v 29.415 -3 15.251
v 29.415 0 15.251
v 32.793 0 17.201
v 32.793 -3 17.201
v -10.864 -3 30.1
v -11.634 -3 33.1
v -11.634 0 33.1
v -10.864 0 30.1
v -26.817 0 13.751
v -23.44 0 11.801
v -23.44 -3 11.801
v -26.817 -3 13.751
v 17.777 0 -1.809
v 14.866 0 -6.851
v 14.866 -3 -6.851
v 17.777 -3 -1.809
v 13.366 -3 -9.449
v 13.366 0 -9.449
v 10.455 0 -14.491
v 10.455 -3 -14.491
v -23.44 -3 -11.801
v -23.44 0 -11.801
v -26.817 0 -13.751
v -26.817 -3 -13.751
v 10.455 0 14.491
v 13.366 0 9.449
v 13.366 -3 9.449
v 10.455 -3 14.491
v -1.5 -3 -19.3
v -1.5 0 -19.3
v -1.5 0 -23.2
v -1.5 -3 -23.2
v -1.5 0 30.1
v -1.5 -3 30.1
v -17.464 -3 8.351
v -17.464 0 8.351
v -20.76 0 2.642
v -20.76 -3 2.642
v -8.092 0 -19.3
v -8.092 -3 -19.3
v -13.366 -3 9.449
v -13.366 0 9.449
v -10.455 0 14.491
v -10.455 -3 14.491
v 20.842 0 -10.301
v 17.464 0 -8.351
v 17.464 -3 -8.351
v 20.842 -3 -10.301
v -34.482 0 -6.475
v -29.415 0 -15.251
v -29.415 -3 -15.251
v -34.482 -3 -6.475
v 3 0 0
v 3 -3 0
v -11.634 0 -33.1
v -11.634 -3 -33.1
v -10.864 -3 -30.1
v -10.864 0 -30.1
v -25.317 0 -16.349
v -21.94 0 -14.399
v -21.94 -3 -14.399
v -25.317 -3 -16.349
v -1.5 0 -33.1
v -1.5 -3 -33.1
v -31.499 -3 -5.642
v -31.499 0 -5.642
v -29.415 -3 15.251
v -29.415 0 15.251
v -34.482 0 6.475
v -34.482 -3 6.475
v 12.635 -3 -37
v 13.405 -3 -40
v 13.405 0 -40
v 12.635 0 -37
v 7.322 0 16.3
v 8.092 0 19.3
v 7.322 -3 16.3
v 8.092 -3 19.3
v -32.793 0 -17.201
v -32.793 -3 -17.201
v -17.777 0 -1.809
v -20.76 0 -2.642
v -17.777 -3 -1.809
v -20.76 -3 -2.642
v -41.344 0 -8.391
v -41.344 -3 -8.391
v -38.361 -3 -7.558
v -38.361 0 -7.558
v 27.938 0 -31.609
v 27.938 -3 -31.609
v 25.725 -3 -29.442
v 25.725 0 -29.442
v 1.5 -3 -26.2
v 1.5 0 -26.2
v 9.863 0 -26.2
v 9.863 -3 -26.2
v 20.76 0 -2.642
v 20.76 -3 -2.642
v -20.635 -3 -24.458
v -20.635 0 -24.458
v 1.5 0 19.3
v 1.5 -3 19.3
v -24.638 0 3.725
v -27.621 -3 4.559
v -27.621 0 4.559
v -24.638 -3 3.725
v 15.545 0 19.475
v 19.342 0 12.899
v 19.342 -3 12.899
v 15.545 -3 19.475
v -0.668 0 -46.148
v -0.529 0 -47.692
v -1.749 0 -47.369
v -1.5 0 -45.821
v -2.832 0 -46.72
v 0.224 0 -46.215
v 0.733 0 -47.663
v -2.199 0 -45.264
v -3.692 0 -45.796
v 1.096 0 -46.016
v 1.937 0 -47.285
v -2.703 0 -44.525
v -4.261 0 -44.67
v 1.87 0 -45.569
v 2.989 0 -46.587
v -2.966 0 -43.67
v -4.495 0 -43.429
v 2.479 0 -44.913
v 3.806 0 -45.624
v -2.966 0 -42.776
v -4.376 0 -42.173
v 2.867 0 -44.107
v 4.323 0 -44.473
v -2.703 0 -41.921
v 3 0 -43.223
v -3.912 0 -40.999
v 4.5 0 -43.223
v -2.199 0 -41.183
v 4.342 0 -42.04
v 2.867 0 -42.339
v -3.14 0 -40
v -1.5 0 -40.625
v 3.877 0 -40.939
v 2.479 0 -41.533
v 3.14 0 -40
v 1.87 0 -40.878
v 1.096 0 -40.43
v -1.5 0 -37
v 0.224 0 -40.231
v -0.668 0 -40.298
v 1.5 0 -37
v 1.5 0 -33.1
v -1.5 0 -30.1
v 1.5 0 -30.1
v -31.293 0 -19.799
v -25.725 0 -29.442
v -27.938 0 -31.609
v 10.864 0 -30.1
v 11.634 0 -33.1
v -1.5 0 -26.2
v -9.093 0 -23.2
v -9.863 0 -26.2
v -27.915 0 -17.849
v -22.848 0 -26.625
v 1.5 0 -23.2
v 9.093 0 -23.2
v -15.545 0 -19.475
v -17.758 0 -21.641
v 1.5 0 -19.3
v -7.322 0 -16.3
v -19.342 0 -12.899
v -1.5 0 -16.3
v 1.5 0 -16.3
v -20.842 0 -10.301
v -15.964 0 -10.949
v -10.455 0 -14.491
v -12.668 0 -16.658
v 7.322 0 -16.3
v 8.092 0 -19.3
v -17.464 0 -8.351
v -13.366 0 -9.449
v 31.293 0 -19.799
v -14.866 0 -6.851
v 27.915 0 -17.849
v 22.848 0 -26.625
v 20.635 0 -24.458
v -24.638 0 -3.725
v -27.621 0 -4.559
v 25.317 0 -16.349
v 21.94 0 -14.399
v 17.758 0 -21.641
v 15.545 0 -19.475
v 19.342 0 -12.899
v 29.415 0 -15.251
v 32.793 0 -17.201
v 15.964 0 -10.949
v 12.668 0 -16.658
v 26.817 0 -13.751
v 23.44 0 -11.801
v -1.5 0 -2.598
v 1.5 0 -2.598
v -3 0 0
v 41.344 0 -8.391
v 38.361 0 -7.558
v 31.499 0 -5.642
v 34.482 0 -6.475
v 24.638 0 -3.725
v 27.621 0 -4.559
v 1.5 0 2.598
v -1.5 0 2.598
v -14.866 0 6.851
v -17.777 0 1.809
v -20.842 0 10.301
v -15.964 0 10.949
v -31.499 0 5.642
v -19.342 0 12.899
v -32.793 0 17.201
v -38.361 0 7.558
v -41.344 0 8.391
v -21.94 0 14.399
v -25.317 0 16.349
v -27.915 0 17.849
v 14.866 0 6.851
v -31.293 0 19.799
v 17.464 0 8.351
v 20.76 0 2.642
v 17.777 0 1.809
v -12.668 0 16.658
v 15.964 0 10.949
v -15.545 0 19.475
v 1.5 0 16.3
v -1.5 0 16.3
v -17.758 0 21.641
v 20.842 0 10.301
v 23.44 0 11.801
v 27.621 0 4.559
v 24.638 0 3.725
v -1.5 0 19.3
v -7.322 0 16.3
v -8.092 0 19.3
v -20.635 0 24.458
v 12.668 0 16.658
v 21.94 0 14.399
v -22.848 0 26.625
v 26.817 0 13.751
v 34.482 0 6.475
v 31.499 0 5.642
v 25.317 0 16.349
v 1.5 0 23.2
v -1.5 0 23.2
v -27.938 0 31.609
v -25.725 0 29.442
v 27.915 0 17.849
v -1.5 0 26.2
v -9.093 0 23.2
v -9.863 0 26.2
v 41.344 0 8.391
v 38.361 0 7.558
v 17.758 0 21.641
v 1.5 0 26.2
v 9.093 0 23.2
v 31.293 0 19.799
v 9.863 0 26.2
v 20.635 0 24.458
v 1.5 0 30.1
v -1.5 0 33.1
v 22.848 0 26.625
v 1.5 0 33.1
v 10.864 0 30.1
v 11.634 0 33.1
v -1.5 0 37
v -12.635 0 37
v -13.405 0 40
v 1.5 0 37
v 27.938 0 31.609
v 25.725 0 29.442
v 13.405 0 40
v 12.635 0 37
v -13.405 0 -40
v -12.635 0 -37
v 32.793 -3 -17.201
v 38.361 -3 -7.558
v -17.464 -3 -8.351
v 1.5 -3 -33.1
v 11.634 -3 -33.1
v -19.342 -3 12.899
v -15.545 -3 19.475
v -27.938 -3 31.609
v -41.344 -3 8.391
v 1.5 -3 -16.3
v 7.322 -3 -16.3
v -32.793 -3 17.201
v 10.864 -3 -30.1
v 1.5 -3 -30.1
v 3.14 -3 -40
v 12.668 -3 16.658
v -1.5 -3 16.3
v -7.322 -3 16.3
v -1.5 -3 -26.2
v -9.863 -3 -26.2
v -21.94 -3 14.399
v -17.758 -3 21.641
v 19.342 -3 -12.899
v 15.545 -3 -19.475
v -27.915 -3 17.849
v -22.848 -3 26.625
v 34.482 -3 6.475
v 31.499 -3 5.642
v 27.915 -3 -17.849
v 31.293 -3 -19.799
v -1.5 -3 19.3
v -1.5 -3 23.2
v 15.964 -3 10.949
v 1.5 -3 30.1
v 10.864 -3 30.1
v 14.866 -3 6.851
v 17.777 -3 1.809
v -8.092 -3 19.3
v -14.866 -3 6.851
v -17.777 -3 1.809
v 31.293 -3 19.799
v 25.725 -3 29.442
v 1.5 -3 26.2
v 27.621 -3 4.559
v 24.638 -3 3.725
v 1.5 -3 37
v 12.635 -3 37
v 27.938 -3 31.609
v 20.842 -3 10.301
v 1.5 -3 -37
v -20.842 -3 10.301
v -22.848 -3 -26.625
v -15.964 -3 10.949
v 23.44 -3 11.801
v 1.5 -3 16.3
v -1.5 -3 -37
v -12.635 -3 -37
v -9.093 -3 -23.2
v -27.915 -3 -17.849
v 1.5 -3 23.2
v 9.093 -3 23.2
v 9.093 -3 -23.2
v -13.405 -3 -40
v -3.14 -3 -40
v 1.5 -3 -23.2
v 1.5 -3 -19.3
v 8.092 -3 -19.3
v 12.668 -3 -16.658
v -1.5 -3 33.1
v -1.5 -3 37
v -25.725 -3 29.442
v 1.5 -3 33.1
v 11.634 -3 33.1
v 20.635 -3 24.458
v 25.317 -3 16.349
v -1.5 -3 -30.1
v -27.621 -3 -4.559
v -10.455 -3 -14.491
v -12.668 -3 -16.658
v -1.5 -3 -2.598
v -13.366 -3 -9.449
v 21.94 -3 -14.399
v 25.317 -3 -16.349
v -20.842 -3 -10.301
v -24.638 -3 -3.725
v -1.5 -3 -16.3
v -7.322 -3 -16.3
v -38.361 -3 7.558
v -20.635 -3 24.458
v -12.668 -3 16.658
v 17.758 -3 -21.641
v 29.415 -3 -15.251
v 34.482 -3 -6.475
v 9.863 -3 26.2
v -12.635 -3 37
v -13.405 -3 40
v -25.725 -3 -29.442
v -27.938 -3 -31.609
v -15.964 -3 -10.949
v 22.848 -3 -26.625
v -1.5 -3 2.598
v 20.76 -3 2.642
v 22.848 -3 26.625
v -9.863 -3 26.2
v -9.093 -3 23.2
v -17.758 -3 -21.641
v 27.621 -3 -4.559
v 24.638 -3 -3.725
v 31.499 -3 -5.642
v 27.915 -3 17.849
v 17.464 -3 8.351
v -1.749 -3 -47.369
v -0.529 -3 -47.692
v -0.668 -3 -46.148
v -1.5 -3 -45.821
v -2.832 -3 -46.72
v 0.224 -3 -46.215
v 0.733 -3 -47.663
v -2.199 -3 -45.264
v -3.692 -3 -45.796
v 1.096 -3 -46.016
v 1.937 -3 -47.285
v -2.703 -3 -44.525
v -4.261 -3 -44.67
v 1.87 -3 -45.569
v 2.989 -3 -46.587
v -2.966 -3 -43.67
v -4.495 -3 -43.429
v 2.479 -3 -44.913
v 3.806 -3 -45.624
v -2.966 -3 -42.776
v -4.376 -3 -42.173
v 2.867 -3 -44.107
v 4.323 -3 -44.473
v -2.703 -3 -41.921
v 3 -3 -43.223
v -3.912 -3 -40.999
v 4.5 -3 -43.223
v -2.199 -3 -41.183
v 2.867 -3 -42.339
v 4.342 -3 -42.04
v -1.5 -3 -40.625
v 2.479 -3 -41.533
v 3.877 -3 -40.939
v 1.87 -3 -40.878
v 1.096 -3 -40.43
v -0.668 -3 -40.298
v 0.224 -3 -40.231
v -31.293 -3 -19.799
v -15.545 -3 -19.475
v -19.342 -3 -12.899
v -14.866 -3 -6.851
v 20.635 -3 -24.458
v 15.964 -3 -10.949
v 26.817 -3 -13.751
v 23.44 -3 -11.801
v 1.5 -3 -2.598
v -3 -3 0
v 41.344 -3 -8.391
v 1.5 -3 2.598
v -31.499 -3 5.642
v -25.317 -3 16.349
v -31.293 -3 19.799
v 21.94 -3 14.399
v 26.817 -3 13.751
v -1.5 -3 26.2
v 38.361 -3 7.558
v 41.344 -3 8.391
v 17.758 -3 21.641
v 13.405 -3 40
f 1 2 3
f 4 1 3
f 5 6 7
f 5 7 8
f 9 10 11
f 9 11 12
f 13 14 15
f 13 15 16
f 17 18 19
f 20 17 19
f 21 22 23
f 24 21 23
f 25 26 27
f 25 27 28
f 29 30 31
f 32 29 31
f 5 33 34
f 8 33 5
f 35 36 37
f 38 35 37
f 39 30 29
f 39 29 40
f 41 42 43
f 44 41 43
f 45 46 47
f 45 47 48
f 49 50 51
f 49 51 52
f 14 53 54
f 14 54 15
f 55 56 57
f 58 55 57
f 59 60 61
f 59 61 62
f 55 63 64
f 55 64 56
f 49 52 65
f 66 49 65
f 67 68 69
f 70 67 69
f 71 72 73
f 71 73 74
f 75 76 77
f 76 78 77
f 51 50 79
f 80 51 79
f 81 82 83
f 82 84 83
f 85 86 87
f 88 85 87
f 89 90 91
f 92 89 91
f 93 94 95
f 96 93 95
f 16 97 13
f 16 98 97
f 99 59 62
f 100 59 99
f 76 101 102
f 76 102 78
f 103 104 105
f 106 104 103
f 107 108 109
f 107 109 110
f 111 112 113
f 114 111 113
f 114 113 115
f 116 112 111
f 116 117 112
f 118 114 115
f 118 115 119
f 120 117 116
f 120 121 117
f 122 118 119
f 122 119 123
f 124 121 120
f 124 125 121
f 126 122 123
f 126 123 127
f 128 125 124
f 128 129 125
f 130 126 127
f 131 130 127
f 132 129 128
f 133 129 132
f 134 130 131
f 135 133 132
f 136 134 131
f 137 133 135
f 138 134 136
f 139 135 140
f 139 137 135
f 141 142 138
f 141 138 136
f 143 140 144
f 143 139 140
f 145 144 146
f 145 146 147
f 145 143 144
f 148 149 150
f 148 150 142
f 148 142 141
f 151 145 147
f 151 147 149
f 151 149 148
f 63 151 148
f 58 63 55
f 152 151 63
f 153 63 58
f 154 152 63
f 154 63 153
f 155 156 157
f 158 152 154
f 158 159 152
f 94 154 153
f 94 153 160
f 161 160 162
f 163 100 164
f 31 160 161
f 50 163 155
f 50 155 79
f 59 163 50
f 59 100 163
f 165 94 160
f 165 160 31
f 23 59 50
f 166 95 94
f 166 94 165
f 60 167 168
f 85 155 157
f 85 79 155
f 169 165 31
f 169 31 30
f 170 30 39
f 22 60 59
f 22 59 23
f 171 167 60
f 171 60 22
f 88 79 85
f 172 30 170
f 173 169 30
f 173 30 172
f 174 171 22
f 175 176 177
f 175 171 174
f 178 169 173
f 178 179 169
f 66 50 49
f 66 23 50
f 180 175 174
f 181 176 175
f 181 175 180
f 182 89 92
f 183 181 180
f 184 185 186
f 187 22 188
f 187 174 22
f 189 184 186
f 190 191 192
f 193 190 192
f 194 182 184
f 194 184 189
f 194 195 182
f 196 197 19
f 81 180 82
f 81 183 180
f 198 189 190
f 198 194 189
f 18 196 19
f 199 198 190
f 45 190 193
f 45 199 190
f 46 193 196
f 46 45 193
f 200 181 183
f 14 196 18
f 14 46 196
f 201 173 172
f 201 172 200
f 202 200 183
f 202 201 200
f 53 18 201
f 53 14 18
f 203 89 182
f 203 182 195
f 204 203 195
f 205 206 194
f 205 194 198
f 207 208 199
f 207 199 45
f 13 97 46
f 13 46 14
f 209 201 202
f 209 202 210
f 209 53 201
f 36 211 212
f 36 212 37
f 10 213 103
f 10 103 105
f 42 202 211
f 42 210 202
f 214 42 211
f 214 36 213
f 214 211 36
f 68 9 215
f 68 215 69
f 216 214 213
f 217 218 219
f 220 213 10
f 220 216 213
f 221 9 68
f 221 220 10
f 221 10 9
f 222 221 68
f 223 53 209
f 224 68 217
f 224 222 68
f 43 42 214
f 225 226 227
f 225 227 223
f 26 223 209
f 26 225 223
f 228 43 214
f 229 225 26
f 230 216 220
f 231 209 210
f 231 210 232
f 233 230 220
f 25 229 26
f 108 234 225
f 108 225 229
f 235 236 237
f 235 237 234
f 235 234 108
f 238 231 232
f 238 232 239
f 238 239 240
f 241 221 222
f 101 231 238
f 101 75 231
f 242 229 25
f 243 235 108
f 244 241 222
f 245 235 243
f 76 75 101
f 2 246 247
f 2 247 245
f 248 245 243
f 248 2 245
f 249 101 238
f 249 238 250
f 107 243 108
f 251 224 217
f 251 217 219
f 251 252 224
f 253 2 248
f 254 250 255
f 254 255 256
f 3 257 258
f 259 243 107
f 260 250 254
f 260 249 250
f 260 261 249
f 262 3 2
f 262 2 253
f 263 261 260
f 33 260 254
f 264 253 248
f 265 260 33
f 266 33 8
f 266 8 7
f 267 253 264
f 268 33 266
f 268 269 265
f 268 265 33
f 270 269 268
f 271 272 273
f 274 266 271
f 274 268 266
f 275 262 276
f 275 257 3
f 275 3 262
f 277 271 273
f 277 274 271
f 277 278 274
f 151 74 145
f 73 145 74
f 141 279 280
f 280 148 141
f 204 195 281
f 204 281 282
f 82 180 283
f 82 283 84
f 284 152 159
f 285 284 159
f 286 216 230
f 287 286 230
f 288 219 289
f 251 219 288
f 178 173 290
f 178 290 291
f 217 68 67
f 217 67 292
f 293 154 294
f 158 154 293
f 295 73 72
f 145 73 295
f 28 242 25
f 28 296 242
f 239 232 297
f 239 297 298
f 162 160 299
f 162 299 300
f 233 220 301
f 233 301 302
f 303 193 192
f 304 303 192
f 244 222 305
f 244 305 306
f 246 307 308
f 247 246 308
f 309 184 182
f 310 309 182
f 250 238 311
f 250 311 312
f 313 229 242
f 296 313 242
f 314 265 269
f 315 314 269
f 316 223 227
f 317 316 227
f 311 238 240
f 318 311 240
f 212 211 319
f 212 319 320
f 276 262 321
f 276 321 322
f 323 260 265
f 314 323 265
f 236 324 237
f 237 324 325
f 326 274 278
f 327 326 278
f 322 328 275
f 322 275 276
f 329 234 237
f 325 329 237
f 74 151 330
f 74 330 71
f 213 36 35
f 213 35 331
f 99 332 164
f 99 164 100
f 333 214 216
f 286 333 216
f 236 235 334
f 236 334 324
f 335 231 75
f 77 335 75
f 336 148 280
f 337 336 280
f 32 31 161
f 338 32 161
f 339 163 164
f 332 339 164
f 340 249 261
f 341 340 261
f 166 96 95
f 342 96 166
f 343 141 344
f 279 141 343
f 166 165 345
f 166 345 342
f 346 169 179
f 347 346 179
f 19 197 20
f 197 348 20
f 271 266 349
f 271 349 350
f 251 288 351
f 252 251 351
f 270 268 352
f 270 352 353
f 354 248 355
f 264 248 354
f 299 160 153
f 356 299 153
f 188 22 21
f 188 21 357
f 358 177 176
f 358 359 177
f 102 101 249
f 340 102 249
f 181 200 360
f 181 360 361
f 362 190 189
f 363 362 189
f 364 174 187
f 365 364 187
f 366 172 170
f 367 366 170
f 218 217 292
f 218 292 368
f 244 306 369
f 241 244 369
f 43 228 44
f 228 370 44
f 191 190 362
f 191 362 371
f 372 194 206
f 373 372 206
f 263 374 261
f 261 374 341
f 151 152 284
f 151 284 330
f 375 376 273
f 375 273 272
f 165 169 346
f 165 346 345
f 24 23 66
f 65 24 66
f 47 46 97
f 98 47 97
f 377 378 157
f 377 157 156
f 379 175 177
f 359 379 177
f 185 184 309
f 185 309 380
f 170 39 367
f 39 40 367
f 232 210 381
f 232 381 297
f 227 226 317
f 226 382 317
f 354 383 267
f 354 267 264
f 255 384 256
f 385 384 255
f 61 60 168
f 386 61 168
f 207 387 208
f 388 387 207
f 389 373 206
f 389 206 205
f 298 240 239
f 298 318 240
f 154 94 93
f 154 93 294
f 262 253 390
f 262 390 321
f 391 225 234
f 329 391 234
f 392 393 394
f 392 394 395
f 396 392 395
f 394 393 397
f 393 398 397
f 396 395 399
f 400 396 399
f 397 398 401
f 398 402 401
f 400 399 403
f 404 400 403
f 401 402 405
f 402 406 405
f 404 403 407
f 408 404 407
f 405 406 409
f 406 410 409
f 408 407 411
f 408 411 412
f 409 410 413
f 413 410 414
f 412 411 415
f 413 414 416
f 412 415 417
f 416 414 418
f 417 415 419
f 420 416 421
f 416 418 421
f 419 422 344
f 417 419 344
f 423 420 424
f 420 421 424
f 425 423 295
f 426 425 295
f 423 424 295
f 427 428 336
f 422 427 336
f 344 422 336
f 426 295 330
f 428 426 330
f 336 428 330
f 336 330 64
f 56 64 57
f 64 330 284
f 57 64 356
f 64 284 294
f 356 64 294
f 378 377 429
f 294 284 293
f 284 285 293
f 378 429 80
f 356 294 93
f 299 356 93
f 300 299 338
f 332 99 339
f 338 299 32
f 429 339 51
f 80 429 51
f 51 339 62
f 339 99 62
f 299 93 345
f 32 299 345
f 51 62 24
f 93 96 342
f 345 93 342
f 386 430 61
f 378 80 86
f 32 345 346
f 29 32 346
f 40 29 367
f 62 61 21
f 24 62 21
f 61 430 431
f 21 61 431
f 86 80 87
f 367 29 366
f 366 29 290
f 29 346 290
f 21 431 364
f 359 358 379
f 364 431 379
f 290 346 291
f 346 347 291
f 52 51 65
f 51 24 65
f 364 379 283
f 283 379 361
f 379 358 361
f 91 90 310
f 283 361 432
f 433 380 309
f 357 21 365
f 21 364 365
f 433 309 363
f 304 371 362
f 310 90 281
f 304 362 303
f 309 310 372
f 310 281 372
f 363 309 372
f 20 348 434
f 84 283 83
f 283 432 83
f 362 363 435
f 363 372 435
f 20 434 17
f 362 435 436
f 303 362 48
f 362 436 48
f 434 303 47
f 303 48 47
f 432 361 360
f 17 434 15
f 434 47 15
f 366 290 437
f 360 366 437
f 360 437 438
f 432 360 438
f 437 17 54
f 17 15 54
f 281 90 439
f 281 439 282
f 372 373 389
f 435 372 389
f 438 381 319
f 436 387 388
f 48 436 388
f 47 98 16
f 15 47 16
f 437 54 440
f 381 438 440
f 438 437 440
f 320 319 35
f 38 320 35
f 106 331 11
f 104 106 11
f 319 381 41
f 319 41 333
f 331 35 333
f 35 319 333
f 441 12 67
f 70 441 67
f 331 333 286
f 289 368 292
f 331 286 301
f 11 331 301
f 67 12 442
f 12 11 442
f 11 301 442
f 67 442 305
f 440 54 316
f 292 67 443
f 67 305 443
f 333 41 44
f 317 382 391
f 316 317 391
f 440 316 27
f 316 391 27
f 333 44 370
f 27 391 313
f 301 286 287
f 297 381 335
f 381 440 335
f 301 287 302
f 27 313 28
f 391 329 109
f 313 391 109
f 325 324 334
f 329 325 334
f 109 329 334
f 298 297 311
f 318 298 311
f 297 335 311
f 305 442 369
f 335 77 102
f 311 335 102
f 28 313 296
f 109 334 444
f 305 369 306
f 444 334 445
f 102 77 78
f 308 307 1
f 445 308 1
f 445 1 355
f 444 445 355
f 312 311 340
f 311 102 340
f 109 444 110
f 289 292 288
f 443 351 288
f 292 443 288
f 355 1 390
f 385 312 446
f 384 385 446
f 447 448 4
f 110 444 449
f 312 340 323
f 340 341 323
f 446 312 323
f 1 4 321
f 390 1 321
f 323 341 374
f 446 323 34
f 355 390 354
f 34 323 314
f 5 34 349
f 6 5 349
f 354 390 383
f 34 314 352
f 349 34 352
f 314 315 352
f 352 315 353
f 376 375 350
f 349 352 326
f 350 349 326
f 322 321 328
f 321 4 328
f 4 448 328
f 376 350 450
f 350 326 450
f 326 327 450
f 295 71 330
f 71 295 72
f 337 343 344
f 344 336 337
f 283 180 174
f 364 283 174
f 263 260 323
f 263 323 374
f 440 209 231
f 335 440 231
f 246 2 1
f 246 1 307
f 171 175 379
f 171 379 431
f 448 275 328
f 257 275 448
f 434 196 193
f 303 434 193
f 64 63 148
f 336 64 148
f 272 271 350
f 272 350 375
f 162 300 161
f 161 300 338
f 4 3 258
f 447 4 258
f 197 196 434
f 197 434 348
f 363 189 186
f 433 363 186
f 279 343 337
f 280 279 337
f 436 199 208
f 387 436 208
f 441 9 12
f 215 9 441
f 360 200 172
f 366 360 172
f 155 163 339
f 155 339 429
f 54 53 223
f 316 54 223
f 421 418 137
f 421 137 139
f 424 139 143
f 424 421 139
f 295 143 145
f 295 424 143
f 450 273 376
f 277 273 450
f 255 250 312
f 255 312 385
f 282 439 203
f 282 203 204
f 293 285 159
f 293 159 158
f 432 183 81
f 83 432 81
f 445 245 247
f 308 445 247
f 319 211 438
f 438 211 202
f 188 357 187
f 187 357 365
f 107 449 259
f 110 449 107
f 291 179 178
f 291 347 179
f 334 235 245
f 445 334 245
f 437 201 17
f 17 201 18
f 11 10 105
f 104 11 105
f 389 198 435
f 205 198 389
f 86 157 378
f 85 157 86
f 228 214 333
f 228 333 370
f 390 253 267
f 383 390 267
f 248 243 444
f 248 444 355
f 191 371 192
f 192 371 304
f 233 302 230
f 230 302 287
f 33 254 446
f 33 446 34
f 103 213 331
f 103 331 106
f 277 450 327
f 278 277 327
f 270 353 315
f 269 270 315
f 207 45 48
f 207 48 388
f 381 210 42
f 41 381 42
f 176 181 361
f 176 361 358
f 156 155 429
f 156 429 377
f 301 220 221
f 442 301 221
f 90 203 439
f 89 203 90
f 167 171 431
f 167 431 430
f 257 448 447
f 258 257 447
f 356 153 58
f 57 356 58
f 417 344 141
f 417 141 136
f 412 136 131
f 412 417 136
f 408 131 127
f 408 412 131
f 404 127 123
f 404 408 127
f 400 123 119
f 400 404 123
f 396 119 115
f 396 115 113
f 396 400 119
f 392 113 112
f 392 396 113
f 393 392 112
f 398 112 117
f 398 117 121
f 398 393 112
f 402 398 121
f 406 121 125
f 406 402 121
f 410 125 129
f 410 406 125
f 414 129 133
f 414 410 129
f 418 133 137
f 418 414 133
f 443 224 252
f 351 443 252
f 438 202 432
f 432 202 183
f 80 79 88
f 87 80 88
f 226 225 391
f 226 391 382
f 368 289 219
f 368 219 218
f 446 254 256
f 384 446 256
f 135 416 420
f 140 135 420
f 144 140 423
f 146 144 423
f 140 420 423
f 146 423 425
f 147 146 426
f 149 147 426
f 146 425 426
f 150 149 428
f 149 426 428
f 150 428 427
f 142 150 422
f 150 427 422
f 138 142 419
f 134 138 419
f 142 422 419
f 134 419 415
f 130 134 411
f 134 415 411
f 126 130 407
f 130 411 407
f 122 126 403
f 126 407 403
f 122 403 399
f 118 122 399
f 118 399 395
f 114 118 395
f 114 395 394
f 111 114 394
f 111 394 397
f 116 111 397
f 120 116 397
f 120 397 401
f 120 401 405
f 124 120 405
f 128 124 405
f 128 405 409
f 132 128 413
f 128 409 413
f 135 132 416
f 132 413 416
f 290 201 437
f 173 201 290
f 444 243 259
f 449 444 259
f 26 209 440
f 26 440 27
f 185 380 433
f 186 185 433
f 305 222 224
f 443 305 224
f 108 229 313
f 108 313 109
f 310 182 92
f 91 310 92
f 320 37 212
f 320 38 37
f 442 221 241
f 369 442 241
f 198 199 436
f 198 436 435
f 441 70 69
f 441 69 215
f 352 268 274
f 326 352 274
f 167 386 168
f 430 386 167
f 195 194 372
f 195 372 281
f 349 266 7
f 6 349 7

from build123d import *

# Parameters (mm, degrees)
F0_W     = 15
F0_H     = 3
F1_DEPTH = 3
F3_DEPTH = 25
F6_COUNT = 6
F8_R     = 3
F9_DEPTH = 3


with BuildPart() as f1:
    # F0 (on Front) → F1 (new body)
    with BuildSketch(Plane.XZ):
        with Locations((9, 38.5)):
            Rectangle(F0_W, F0_H)
        with Locations((9, 31.6)):
            Rectangle(F0_W, F0_H)
        with Locations((9, 24.7)):
            Rectangle(F0_W, F0_H)
        with Locations((9, 17.8)):
            Rectangle(F0_W, F0_H)
        Polygon((0, 40), (0, 0), (1.5, 0), (1.5, 16.3), (1.5, 19.3), (1.5, 23.2), (1.5, 26.2), (1.5, 30.1), (1.5, 33.1), (1.5, 37), (1.5, 40), align=None)
    extrude(amount=F1_DEPTH)

    # F2 (on face) → F3 (cut)
    with BuildSketch(Plane.XZ.offset(3)):
        Polygon((13.405226, 40), (7.321541, 16.3), (20.32141, 16.3), (16.5, 40), align=None)
    extrude(amount=-F3_DEPTH, mode=Mode.SUBTRACT)

    # F4: F1 across plane


with BuildPart() as f1_1:
    add(f1.part)
    add(f1.part.mirror(Plane.YZ))


with BuildPart() as f6_1:
    # F6: instance of F1
    add(f1_1.part.rotate(Axis((0, 13.050985, 0), (0, 1, 0)), 1 * 360 / F6_COUNT))


with BuildPart() as f6_2:
    # F6: instance of F1
    add(f1_1.part.rotate(Axis((0, 13.050985, 0), (0, 1, 0)), 2 * 360 / F6_COUNT))


with BuildPart() as f6_3:
    # F6: instance of F1
    add(f1_1.part.rotate(Axis((0, 13.050985, 0), (0, 1, 0)), 3 * 360 / F6_COUNT))


with BuildPart() as f6_4:
    # F6: instance of F1
    add(f1_1.part.rotate(Axis((0, 13.050985, 0), (0, 1, 0)), 4 * 360 / F6_COUNT))


with BuildPart() as f6_5:
    # F6: instance of F1
    add(f1_1.part.rotate(Axis((0, 13.050985, 0), (0, 1, 0)), 5 * 360 / F6_COUNT))

    # F7: union F1, F6_2, F6_3, F6_4, F6_1
    add(f1_1.part)
    add(f6_2.part)
    add(f6_3.part)
    add(f6_4.part)
    add(f6_1.part)

    # F8 (on face) → F9 (join, through all)
    with BuildSketch(Plane.XZ.offset(3)):
        with BuildLine():
            ThreePointArc((-3.140397, -40), (-1.74903, -47.369217), (4.5, -43.223027))
            ThreePointArc((4.5, -43.223027), (4.14619, -41.473997), (3.140397, -40))
            Line((3.140397, -40), (-3.140397, -40))
        make_face()
        with Locations((0, -43.223027)):
            Circle(F8_R, mode=Mode.SUBTRACT)
    extrude(amount=-F9_DEPTH)


solid = f6_5.part
